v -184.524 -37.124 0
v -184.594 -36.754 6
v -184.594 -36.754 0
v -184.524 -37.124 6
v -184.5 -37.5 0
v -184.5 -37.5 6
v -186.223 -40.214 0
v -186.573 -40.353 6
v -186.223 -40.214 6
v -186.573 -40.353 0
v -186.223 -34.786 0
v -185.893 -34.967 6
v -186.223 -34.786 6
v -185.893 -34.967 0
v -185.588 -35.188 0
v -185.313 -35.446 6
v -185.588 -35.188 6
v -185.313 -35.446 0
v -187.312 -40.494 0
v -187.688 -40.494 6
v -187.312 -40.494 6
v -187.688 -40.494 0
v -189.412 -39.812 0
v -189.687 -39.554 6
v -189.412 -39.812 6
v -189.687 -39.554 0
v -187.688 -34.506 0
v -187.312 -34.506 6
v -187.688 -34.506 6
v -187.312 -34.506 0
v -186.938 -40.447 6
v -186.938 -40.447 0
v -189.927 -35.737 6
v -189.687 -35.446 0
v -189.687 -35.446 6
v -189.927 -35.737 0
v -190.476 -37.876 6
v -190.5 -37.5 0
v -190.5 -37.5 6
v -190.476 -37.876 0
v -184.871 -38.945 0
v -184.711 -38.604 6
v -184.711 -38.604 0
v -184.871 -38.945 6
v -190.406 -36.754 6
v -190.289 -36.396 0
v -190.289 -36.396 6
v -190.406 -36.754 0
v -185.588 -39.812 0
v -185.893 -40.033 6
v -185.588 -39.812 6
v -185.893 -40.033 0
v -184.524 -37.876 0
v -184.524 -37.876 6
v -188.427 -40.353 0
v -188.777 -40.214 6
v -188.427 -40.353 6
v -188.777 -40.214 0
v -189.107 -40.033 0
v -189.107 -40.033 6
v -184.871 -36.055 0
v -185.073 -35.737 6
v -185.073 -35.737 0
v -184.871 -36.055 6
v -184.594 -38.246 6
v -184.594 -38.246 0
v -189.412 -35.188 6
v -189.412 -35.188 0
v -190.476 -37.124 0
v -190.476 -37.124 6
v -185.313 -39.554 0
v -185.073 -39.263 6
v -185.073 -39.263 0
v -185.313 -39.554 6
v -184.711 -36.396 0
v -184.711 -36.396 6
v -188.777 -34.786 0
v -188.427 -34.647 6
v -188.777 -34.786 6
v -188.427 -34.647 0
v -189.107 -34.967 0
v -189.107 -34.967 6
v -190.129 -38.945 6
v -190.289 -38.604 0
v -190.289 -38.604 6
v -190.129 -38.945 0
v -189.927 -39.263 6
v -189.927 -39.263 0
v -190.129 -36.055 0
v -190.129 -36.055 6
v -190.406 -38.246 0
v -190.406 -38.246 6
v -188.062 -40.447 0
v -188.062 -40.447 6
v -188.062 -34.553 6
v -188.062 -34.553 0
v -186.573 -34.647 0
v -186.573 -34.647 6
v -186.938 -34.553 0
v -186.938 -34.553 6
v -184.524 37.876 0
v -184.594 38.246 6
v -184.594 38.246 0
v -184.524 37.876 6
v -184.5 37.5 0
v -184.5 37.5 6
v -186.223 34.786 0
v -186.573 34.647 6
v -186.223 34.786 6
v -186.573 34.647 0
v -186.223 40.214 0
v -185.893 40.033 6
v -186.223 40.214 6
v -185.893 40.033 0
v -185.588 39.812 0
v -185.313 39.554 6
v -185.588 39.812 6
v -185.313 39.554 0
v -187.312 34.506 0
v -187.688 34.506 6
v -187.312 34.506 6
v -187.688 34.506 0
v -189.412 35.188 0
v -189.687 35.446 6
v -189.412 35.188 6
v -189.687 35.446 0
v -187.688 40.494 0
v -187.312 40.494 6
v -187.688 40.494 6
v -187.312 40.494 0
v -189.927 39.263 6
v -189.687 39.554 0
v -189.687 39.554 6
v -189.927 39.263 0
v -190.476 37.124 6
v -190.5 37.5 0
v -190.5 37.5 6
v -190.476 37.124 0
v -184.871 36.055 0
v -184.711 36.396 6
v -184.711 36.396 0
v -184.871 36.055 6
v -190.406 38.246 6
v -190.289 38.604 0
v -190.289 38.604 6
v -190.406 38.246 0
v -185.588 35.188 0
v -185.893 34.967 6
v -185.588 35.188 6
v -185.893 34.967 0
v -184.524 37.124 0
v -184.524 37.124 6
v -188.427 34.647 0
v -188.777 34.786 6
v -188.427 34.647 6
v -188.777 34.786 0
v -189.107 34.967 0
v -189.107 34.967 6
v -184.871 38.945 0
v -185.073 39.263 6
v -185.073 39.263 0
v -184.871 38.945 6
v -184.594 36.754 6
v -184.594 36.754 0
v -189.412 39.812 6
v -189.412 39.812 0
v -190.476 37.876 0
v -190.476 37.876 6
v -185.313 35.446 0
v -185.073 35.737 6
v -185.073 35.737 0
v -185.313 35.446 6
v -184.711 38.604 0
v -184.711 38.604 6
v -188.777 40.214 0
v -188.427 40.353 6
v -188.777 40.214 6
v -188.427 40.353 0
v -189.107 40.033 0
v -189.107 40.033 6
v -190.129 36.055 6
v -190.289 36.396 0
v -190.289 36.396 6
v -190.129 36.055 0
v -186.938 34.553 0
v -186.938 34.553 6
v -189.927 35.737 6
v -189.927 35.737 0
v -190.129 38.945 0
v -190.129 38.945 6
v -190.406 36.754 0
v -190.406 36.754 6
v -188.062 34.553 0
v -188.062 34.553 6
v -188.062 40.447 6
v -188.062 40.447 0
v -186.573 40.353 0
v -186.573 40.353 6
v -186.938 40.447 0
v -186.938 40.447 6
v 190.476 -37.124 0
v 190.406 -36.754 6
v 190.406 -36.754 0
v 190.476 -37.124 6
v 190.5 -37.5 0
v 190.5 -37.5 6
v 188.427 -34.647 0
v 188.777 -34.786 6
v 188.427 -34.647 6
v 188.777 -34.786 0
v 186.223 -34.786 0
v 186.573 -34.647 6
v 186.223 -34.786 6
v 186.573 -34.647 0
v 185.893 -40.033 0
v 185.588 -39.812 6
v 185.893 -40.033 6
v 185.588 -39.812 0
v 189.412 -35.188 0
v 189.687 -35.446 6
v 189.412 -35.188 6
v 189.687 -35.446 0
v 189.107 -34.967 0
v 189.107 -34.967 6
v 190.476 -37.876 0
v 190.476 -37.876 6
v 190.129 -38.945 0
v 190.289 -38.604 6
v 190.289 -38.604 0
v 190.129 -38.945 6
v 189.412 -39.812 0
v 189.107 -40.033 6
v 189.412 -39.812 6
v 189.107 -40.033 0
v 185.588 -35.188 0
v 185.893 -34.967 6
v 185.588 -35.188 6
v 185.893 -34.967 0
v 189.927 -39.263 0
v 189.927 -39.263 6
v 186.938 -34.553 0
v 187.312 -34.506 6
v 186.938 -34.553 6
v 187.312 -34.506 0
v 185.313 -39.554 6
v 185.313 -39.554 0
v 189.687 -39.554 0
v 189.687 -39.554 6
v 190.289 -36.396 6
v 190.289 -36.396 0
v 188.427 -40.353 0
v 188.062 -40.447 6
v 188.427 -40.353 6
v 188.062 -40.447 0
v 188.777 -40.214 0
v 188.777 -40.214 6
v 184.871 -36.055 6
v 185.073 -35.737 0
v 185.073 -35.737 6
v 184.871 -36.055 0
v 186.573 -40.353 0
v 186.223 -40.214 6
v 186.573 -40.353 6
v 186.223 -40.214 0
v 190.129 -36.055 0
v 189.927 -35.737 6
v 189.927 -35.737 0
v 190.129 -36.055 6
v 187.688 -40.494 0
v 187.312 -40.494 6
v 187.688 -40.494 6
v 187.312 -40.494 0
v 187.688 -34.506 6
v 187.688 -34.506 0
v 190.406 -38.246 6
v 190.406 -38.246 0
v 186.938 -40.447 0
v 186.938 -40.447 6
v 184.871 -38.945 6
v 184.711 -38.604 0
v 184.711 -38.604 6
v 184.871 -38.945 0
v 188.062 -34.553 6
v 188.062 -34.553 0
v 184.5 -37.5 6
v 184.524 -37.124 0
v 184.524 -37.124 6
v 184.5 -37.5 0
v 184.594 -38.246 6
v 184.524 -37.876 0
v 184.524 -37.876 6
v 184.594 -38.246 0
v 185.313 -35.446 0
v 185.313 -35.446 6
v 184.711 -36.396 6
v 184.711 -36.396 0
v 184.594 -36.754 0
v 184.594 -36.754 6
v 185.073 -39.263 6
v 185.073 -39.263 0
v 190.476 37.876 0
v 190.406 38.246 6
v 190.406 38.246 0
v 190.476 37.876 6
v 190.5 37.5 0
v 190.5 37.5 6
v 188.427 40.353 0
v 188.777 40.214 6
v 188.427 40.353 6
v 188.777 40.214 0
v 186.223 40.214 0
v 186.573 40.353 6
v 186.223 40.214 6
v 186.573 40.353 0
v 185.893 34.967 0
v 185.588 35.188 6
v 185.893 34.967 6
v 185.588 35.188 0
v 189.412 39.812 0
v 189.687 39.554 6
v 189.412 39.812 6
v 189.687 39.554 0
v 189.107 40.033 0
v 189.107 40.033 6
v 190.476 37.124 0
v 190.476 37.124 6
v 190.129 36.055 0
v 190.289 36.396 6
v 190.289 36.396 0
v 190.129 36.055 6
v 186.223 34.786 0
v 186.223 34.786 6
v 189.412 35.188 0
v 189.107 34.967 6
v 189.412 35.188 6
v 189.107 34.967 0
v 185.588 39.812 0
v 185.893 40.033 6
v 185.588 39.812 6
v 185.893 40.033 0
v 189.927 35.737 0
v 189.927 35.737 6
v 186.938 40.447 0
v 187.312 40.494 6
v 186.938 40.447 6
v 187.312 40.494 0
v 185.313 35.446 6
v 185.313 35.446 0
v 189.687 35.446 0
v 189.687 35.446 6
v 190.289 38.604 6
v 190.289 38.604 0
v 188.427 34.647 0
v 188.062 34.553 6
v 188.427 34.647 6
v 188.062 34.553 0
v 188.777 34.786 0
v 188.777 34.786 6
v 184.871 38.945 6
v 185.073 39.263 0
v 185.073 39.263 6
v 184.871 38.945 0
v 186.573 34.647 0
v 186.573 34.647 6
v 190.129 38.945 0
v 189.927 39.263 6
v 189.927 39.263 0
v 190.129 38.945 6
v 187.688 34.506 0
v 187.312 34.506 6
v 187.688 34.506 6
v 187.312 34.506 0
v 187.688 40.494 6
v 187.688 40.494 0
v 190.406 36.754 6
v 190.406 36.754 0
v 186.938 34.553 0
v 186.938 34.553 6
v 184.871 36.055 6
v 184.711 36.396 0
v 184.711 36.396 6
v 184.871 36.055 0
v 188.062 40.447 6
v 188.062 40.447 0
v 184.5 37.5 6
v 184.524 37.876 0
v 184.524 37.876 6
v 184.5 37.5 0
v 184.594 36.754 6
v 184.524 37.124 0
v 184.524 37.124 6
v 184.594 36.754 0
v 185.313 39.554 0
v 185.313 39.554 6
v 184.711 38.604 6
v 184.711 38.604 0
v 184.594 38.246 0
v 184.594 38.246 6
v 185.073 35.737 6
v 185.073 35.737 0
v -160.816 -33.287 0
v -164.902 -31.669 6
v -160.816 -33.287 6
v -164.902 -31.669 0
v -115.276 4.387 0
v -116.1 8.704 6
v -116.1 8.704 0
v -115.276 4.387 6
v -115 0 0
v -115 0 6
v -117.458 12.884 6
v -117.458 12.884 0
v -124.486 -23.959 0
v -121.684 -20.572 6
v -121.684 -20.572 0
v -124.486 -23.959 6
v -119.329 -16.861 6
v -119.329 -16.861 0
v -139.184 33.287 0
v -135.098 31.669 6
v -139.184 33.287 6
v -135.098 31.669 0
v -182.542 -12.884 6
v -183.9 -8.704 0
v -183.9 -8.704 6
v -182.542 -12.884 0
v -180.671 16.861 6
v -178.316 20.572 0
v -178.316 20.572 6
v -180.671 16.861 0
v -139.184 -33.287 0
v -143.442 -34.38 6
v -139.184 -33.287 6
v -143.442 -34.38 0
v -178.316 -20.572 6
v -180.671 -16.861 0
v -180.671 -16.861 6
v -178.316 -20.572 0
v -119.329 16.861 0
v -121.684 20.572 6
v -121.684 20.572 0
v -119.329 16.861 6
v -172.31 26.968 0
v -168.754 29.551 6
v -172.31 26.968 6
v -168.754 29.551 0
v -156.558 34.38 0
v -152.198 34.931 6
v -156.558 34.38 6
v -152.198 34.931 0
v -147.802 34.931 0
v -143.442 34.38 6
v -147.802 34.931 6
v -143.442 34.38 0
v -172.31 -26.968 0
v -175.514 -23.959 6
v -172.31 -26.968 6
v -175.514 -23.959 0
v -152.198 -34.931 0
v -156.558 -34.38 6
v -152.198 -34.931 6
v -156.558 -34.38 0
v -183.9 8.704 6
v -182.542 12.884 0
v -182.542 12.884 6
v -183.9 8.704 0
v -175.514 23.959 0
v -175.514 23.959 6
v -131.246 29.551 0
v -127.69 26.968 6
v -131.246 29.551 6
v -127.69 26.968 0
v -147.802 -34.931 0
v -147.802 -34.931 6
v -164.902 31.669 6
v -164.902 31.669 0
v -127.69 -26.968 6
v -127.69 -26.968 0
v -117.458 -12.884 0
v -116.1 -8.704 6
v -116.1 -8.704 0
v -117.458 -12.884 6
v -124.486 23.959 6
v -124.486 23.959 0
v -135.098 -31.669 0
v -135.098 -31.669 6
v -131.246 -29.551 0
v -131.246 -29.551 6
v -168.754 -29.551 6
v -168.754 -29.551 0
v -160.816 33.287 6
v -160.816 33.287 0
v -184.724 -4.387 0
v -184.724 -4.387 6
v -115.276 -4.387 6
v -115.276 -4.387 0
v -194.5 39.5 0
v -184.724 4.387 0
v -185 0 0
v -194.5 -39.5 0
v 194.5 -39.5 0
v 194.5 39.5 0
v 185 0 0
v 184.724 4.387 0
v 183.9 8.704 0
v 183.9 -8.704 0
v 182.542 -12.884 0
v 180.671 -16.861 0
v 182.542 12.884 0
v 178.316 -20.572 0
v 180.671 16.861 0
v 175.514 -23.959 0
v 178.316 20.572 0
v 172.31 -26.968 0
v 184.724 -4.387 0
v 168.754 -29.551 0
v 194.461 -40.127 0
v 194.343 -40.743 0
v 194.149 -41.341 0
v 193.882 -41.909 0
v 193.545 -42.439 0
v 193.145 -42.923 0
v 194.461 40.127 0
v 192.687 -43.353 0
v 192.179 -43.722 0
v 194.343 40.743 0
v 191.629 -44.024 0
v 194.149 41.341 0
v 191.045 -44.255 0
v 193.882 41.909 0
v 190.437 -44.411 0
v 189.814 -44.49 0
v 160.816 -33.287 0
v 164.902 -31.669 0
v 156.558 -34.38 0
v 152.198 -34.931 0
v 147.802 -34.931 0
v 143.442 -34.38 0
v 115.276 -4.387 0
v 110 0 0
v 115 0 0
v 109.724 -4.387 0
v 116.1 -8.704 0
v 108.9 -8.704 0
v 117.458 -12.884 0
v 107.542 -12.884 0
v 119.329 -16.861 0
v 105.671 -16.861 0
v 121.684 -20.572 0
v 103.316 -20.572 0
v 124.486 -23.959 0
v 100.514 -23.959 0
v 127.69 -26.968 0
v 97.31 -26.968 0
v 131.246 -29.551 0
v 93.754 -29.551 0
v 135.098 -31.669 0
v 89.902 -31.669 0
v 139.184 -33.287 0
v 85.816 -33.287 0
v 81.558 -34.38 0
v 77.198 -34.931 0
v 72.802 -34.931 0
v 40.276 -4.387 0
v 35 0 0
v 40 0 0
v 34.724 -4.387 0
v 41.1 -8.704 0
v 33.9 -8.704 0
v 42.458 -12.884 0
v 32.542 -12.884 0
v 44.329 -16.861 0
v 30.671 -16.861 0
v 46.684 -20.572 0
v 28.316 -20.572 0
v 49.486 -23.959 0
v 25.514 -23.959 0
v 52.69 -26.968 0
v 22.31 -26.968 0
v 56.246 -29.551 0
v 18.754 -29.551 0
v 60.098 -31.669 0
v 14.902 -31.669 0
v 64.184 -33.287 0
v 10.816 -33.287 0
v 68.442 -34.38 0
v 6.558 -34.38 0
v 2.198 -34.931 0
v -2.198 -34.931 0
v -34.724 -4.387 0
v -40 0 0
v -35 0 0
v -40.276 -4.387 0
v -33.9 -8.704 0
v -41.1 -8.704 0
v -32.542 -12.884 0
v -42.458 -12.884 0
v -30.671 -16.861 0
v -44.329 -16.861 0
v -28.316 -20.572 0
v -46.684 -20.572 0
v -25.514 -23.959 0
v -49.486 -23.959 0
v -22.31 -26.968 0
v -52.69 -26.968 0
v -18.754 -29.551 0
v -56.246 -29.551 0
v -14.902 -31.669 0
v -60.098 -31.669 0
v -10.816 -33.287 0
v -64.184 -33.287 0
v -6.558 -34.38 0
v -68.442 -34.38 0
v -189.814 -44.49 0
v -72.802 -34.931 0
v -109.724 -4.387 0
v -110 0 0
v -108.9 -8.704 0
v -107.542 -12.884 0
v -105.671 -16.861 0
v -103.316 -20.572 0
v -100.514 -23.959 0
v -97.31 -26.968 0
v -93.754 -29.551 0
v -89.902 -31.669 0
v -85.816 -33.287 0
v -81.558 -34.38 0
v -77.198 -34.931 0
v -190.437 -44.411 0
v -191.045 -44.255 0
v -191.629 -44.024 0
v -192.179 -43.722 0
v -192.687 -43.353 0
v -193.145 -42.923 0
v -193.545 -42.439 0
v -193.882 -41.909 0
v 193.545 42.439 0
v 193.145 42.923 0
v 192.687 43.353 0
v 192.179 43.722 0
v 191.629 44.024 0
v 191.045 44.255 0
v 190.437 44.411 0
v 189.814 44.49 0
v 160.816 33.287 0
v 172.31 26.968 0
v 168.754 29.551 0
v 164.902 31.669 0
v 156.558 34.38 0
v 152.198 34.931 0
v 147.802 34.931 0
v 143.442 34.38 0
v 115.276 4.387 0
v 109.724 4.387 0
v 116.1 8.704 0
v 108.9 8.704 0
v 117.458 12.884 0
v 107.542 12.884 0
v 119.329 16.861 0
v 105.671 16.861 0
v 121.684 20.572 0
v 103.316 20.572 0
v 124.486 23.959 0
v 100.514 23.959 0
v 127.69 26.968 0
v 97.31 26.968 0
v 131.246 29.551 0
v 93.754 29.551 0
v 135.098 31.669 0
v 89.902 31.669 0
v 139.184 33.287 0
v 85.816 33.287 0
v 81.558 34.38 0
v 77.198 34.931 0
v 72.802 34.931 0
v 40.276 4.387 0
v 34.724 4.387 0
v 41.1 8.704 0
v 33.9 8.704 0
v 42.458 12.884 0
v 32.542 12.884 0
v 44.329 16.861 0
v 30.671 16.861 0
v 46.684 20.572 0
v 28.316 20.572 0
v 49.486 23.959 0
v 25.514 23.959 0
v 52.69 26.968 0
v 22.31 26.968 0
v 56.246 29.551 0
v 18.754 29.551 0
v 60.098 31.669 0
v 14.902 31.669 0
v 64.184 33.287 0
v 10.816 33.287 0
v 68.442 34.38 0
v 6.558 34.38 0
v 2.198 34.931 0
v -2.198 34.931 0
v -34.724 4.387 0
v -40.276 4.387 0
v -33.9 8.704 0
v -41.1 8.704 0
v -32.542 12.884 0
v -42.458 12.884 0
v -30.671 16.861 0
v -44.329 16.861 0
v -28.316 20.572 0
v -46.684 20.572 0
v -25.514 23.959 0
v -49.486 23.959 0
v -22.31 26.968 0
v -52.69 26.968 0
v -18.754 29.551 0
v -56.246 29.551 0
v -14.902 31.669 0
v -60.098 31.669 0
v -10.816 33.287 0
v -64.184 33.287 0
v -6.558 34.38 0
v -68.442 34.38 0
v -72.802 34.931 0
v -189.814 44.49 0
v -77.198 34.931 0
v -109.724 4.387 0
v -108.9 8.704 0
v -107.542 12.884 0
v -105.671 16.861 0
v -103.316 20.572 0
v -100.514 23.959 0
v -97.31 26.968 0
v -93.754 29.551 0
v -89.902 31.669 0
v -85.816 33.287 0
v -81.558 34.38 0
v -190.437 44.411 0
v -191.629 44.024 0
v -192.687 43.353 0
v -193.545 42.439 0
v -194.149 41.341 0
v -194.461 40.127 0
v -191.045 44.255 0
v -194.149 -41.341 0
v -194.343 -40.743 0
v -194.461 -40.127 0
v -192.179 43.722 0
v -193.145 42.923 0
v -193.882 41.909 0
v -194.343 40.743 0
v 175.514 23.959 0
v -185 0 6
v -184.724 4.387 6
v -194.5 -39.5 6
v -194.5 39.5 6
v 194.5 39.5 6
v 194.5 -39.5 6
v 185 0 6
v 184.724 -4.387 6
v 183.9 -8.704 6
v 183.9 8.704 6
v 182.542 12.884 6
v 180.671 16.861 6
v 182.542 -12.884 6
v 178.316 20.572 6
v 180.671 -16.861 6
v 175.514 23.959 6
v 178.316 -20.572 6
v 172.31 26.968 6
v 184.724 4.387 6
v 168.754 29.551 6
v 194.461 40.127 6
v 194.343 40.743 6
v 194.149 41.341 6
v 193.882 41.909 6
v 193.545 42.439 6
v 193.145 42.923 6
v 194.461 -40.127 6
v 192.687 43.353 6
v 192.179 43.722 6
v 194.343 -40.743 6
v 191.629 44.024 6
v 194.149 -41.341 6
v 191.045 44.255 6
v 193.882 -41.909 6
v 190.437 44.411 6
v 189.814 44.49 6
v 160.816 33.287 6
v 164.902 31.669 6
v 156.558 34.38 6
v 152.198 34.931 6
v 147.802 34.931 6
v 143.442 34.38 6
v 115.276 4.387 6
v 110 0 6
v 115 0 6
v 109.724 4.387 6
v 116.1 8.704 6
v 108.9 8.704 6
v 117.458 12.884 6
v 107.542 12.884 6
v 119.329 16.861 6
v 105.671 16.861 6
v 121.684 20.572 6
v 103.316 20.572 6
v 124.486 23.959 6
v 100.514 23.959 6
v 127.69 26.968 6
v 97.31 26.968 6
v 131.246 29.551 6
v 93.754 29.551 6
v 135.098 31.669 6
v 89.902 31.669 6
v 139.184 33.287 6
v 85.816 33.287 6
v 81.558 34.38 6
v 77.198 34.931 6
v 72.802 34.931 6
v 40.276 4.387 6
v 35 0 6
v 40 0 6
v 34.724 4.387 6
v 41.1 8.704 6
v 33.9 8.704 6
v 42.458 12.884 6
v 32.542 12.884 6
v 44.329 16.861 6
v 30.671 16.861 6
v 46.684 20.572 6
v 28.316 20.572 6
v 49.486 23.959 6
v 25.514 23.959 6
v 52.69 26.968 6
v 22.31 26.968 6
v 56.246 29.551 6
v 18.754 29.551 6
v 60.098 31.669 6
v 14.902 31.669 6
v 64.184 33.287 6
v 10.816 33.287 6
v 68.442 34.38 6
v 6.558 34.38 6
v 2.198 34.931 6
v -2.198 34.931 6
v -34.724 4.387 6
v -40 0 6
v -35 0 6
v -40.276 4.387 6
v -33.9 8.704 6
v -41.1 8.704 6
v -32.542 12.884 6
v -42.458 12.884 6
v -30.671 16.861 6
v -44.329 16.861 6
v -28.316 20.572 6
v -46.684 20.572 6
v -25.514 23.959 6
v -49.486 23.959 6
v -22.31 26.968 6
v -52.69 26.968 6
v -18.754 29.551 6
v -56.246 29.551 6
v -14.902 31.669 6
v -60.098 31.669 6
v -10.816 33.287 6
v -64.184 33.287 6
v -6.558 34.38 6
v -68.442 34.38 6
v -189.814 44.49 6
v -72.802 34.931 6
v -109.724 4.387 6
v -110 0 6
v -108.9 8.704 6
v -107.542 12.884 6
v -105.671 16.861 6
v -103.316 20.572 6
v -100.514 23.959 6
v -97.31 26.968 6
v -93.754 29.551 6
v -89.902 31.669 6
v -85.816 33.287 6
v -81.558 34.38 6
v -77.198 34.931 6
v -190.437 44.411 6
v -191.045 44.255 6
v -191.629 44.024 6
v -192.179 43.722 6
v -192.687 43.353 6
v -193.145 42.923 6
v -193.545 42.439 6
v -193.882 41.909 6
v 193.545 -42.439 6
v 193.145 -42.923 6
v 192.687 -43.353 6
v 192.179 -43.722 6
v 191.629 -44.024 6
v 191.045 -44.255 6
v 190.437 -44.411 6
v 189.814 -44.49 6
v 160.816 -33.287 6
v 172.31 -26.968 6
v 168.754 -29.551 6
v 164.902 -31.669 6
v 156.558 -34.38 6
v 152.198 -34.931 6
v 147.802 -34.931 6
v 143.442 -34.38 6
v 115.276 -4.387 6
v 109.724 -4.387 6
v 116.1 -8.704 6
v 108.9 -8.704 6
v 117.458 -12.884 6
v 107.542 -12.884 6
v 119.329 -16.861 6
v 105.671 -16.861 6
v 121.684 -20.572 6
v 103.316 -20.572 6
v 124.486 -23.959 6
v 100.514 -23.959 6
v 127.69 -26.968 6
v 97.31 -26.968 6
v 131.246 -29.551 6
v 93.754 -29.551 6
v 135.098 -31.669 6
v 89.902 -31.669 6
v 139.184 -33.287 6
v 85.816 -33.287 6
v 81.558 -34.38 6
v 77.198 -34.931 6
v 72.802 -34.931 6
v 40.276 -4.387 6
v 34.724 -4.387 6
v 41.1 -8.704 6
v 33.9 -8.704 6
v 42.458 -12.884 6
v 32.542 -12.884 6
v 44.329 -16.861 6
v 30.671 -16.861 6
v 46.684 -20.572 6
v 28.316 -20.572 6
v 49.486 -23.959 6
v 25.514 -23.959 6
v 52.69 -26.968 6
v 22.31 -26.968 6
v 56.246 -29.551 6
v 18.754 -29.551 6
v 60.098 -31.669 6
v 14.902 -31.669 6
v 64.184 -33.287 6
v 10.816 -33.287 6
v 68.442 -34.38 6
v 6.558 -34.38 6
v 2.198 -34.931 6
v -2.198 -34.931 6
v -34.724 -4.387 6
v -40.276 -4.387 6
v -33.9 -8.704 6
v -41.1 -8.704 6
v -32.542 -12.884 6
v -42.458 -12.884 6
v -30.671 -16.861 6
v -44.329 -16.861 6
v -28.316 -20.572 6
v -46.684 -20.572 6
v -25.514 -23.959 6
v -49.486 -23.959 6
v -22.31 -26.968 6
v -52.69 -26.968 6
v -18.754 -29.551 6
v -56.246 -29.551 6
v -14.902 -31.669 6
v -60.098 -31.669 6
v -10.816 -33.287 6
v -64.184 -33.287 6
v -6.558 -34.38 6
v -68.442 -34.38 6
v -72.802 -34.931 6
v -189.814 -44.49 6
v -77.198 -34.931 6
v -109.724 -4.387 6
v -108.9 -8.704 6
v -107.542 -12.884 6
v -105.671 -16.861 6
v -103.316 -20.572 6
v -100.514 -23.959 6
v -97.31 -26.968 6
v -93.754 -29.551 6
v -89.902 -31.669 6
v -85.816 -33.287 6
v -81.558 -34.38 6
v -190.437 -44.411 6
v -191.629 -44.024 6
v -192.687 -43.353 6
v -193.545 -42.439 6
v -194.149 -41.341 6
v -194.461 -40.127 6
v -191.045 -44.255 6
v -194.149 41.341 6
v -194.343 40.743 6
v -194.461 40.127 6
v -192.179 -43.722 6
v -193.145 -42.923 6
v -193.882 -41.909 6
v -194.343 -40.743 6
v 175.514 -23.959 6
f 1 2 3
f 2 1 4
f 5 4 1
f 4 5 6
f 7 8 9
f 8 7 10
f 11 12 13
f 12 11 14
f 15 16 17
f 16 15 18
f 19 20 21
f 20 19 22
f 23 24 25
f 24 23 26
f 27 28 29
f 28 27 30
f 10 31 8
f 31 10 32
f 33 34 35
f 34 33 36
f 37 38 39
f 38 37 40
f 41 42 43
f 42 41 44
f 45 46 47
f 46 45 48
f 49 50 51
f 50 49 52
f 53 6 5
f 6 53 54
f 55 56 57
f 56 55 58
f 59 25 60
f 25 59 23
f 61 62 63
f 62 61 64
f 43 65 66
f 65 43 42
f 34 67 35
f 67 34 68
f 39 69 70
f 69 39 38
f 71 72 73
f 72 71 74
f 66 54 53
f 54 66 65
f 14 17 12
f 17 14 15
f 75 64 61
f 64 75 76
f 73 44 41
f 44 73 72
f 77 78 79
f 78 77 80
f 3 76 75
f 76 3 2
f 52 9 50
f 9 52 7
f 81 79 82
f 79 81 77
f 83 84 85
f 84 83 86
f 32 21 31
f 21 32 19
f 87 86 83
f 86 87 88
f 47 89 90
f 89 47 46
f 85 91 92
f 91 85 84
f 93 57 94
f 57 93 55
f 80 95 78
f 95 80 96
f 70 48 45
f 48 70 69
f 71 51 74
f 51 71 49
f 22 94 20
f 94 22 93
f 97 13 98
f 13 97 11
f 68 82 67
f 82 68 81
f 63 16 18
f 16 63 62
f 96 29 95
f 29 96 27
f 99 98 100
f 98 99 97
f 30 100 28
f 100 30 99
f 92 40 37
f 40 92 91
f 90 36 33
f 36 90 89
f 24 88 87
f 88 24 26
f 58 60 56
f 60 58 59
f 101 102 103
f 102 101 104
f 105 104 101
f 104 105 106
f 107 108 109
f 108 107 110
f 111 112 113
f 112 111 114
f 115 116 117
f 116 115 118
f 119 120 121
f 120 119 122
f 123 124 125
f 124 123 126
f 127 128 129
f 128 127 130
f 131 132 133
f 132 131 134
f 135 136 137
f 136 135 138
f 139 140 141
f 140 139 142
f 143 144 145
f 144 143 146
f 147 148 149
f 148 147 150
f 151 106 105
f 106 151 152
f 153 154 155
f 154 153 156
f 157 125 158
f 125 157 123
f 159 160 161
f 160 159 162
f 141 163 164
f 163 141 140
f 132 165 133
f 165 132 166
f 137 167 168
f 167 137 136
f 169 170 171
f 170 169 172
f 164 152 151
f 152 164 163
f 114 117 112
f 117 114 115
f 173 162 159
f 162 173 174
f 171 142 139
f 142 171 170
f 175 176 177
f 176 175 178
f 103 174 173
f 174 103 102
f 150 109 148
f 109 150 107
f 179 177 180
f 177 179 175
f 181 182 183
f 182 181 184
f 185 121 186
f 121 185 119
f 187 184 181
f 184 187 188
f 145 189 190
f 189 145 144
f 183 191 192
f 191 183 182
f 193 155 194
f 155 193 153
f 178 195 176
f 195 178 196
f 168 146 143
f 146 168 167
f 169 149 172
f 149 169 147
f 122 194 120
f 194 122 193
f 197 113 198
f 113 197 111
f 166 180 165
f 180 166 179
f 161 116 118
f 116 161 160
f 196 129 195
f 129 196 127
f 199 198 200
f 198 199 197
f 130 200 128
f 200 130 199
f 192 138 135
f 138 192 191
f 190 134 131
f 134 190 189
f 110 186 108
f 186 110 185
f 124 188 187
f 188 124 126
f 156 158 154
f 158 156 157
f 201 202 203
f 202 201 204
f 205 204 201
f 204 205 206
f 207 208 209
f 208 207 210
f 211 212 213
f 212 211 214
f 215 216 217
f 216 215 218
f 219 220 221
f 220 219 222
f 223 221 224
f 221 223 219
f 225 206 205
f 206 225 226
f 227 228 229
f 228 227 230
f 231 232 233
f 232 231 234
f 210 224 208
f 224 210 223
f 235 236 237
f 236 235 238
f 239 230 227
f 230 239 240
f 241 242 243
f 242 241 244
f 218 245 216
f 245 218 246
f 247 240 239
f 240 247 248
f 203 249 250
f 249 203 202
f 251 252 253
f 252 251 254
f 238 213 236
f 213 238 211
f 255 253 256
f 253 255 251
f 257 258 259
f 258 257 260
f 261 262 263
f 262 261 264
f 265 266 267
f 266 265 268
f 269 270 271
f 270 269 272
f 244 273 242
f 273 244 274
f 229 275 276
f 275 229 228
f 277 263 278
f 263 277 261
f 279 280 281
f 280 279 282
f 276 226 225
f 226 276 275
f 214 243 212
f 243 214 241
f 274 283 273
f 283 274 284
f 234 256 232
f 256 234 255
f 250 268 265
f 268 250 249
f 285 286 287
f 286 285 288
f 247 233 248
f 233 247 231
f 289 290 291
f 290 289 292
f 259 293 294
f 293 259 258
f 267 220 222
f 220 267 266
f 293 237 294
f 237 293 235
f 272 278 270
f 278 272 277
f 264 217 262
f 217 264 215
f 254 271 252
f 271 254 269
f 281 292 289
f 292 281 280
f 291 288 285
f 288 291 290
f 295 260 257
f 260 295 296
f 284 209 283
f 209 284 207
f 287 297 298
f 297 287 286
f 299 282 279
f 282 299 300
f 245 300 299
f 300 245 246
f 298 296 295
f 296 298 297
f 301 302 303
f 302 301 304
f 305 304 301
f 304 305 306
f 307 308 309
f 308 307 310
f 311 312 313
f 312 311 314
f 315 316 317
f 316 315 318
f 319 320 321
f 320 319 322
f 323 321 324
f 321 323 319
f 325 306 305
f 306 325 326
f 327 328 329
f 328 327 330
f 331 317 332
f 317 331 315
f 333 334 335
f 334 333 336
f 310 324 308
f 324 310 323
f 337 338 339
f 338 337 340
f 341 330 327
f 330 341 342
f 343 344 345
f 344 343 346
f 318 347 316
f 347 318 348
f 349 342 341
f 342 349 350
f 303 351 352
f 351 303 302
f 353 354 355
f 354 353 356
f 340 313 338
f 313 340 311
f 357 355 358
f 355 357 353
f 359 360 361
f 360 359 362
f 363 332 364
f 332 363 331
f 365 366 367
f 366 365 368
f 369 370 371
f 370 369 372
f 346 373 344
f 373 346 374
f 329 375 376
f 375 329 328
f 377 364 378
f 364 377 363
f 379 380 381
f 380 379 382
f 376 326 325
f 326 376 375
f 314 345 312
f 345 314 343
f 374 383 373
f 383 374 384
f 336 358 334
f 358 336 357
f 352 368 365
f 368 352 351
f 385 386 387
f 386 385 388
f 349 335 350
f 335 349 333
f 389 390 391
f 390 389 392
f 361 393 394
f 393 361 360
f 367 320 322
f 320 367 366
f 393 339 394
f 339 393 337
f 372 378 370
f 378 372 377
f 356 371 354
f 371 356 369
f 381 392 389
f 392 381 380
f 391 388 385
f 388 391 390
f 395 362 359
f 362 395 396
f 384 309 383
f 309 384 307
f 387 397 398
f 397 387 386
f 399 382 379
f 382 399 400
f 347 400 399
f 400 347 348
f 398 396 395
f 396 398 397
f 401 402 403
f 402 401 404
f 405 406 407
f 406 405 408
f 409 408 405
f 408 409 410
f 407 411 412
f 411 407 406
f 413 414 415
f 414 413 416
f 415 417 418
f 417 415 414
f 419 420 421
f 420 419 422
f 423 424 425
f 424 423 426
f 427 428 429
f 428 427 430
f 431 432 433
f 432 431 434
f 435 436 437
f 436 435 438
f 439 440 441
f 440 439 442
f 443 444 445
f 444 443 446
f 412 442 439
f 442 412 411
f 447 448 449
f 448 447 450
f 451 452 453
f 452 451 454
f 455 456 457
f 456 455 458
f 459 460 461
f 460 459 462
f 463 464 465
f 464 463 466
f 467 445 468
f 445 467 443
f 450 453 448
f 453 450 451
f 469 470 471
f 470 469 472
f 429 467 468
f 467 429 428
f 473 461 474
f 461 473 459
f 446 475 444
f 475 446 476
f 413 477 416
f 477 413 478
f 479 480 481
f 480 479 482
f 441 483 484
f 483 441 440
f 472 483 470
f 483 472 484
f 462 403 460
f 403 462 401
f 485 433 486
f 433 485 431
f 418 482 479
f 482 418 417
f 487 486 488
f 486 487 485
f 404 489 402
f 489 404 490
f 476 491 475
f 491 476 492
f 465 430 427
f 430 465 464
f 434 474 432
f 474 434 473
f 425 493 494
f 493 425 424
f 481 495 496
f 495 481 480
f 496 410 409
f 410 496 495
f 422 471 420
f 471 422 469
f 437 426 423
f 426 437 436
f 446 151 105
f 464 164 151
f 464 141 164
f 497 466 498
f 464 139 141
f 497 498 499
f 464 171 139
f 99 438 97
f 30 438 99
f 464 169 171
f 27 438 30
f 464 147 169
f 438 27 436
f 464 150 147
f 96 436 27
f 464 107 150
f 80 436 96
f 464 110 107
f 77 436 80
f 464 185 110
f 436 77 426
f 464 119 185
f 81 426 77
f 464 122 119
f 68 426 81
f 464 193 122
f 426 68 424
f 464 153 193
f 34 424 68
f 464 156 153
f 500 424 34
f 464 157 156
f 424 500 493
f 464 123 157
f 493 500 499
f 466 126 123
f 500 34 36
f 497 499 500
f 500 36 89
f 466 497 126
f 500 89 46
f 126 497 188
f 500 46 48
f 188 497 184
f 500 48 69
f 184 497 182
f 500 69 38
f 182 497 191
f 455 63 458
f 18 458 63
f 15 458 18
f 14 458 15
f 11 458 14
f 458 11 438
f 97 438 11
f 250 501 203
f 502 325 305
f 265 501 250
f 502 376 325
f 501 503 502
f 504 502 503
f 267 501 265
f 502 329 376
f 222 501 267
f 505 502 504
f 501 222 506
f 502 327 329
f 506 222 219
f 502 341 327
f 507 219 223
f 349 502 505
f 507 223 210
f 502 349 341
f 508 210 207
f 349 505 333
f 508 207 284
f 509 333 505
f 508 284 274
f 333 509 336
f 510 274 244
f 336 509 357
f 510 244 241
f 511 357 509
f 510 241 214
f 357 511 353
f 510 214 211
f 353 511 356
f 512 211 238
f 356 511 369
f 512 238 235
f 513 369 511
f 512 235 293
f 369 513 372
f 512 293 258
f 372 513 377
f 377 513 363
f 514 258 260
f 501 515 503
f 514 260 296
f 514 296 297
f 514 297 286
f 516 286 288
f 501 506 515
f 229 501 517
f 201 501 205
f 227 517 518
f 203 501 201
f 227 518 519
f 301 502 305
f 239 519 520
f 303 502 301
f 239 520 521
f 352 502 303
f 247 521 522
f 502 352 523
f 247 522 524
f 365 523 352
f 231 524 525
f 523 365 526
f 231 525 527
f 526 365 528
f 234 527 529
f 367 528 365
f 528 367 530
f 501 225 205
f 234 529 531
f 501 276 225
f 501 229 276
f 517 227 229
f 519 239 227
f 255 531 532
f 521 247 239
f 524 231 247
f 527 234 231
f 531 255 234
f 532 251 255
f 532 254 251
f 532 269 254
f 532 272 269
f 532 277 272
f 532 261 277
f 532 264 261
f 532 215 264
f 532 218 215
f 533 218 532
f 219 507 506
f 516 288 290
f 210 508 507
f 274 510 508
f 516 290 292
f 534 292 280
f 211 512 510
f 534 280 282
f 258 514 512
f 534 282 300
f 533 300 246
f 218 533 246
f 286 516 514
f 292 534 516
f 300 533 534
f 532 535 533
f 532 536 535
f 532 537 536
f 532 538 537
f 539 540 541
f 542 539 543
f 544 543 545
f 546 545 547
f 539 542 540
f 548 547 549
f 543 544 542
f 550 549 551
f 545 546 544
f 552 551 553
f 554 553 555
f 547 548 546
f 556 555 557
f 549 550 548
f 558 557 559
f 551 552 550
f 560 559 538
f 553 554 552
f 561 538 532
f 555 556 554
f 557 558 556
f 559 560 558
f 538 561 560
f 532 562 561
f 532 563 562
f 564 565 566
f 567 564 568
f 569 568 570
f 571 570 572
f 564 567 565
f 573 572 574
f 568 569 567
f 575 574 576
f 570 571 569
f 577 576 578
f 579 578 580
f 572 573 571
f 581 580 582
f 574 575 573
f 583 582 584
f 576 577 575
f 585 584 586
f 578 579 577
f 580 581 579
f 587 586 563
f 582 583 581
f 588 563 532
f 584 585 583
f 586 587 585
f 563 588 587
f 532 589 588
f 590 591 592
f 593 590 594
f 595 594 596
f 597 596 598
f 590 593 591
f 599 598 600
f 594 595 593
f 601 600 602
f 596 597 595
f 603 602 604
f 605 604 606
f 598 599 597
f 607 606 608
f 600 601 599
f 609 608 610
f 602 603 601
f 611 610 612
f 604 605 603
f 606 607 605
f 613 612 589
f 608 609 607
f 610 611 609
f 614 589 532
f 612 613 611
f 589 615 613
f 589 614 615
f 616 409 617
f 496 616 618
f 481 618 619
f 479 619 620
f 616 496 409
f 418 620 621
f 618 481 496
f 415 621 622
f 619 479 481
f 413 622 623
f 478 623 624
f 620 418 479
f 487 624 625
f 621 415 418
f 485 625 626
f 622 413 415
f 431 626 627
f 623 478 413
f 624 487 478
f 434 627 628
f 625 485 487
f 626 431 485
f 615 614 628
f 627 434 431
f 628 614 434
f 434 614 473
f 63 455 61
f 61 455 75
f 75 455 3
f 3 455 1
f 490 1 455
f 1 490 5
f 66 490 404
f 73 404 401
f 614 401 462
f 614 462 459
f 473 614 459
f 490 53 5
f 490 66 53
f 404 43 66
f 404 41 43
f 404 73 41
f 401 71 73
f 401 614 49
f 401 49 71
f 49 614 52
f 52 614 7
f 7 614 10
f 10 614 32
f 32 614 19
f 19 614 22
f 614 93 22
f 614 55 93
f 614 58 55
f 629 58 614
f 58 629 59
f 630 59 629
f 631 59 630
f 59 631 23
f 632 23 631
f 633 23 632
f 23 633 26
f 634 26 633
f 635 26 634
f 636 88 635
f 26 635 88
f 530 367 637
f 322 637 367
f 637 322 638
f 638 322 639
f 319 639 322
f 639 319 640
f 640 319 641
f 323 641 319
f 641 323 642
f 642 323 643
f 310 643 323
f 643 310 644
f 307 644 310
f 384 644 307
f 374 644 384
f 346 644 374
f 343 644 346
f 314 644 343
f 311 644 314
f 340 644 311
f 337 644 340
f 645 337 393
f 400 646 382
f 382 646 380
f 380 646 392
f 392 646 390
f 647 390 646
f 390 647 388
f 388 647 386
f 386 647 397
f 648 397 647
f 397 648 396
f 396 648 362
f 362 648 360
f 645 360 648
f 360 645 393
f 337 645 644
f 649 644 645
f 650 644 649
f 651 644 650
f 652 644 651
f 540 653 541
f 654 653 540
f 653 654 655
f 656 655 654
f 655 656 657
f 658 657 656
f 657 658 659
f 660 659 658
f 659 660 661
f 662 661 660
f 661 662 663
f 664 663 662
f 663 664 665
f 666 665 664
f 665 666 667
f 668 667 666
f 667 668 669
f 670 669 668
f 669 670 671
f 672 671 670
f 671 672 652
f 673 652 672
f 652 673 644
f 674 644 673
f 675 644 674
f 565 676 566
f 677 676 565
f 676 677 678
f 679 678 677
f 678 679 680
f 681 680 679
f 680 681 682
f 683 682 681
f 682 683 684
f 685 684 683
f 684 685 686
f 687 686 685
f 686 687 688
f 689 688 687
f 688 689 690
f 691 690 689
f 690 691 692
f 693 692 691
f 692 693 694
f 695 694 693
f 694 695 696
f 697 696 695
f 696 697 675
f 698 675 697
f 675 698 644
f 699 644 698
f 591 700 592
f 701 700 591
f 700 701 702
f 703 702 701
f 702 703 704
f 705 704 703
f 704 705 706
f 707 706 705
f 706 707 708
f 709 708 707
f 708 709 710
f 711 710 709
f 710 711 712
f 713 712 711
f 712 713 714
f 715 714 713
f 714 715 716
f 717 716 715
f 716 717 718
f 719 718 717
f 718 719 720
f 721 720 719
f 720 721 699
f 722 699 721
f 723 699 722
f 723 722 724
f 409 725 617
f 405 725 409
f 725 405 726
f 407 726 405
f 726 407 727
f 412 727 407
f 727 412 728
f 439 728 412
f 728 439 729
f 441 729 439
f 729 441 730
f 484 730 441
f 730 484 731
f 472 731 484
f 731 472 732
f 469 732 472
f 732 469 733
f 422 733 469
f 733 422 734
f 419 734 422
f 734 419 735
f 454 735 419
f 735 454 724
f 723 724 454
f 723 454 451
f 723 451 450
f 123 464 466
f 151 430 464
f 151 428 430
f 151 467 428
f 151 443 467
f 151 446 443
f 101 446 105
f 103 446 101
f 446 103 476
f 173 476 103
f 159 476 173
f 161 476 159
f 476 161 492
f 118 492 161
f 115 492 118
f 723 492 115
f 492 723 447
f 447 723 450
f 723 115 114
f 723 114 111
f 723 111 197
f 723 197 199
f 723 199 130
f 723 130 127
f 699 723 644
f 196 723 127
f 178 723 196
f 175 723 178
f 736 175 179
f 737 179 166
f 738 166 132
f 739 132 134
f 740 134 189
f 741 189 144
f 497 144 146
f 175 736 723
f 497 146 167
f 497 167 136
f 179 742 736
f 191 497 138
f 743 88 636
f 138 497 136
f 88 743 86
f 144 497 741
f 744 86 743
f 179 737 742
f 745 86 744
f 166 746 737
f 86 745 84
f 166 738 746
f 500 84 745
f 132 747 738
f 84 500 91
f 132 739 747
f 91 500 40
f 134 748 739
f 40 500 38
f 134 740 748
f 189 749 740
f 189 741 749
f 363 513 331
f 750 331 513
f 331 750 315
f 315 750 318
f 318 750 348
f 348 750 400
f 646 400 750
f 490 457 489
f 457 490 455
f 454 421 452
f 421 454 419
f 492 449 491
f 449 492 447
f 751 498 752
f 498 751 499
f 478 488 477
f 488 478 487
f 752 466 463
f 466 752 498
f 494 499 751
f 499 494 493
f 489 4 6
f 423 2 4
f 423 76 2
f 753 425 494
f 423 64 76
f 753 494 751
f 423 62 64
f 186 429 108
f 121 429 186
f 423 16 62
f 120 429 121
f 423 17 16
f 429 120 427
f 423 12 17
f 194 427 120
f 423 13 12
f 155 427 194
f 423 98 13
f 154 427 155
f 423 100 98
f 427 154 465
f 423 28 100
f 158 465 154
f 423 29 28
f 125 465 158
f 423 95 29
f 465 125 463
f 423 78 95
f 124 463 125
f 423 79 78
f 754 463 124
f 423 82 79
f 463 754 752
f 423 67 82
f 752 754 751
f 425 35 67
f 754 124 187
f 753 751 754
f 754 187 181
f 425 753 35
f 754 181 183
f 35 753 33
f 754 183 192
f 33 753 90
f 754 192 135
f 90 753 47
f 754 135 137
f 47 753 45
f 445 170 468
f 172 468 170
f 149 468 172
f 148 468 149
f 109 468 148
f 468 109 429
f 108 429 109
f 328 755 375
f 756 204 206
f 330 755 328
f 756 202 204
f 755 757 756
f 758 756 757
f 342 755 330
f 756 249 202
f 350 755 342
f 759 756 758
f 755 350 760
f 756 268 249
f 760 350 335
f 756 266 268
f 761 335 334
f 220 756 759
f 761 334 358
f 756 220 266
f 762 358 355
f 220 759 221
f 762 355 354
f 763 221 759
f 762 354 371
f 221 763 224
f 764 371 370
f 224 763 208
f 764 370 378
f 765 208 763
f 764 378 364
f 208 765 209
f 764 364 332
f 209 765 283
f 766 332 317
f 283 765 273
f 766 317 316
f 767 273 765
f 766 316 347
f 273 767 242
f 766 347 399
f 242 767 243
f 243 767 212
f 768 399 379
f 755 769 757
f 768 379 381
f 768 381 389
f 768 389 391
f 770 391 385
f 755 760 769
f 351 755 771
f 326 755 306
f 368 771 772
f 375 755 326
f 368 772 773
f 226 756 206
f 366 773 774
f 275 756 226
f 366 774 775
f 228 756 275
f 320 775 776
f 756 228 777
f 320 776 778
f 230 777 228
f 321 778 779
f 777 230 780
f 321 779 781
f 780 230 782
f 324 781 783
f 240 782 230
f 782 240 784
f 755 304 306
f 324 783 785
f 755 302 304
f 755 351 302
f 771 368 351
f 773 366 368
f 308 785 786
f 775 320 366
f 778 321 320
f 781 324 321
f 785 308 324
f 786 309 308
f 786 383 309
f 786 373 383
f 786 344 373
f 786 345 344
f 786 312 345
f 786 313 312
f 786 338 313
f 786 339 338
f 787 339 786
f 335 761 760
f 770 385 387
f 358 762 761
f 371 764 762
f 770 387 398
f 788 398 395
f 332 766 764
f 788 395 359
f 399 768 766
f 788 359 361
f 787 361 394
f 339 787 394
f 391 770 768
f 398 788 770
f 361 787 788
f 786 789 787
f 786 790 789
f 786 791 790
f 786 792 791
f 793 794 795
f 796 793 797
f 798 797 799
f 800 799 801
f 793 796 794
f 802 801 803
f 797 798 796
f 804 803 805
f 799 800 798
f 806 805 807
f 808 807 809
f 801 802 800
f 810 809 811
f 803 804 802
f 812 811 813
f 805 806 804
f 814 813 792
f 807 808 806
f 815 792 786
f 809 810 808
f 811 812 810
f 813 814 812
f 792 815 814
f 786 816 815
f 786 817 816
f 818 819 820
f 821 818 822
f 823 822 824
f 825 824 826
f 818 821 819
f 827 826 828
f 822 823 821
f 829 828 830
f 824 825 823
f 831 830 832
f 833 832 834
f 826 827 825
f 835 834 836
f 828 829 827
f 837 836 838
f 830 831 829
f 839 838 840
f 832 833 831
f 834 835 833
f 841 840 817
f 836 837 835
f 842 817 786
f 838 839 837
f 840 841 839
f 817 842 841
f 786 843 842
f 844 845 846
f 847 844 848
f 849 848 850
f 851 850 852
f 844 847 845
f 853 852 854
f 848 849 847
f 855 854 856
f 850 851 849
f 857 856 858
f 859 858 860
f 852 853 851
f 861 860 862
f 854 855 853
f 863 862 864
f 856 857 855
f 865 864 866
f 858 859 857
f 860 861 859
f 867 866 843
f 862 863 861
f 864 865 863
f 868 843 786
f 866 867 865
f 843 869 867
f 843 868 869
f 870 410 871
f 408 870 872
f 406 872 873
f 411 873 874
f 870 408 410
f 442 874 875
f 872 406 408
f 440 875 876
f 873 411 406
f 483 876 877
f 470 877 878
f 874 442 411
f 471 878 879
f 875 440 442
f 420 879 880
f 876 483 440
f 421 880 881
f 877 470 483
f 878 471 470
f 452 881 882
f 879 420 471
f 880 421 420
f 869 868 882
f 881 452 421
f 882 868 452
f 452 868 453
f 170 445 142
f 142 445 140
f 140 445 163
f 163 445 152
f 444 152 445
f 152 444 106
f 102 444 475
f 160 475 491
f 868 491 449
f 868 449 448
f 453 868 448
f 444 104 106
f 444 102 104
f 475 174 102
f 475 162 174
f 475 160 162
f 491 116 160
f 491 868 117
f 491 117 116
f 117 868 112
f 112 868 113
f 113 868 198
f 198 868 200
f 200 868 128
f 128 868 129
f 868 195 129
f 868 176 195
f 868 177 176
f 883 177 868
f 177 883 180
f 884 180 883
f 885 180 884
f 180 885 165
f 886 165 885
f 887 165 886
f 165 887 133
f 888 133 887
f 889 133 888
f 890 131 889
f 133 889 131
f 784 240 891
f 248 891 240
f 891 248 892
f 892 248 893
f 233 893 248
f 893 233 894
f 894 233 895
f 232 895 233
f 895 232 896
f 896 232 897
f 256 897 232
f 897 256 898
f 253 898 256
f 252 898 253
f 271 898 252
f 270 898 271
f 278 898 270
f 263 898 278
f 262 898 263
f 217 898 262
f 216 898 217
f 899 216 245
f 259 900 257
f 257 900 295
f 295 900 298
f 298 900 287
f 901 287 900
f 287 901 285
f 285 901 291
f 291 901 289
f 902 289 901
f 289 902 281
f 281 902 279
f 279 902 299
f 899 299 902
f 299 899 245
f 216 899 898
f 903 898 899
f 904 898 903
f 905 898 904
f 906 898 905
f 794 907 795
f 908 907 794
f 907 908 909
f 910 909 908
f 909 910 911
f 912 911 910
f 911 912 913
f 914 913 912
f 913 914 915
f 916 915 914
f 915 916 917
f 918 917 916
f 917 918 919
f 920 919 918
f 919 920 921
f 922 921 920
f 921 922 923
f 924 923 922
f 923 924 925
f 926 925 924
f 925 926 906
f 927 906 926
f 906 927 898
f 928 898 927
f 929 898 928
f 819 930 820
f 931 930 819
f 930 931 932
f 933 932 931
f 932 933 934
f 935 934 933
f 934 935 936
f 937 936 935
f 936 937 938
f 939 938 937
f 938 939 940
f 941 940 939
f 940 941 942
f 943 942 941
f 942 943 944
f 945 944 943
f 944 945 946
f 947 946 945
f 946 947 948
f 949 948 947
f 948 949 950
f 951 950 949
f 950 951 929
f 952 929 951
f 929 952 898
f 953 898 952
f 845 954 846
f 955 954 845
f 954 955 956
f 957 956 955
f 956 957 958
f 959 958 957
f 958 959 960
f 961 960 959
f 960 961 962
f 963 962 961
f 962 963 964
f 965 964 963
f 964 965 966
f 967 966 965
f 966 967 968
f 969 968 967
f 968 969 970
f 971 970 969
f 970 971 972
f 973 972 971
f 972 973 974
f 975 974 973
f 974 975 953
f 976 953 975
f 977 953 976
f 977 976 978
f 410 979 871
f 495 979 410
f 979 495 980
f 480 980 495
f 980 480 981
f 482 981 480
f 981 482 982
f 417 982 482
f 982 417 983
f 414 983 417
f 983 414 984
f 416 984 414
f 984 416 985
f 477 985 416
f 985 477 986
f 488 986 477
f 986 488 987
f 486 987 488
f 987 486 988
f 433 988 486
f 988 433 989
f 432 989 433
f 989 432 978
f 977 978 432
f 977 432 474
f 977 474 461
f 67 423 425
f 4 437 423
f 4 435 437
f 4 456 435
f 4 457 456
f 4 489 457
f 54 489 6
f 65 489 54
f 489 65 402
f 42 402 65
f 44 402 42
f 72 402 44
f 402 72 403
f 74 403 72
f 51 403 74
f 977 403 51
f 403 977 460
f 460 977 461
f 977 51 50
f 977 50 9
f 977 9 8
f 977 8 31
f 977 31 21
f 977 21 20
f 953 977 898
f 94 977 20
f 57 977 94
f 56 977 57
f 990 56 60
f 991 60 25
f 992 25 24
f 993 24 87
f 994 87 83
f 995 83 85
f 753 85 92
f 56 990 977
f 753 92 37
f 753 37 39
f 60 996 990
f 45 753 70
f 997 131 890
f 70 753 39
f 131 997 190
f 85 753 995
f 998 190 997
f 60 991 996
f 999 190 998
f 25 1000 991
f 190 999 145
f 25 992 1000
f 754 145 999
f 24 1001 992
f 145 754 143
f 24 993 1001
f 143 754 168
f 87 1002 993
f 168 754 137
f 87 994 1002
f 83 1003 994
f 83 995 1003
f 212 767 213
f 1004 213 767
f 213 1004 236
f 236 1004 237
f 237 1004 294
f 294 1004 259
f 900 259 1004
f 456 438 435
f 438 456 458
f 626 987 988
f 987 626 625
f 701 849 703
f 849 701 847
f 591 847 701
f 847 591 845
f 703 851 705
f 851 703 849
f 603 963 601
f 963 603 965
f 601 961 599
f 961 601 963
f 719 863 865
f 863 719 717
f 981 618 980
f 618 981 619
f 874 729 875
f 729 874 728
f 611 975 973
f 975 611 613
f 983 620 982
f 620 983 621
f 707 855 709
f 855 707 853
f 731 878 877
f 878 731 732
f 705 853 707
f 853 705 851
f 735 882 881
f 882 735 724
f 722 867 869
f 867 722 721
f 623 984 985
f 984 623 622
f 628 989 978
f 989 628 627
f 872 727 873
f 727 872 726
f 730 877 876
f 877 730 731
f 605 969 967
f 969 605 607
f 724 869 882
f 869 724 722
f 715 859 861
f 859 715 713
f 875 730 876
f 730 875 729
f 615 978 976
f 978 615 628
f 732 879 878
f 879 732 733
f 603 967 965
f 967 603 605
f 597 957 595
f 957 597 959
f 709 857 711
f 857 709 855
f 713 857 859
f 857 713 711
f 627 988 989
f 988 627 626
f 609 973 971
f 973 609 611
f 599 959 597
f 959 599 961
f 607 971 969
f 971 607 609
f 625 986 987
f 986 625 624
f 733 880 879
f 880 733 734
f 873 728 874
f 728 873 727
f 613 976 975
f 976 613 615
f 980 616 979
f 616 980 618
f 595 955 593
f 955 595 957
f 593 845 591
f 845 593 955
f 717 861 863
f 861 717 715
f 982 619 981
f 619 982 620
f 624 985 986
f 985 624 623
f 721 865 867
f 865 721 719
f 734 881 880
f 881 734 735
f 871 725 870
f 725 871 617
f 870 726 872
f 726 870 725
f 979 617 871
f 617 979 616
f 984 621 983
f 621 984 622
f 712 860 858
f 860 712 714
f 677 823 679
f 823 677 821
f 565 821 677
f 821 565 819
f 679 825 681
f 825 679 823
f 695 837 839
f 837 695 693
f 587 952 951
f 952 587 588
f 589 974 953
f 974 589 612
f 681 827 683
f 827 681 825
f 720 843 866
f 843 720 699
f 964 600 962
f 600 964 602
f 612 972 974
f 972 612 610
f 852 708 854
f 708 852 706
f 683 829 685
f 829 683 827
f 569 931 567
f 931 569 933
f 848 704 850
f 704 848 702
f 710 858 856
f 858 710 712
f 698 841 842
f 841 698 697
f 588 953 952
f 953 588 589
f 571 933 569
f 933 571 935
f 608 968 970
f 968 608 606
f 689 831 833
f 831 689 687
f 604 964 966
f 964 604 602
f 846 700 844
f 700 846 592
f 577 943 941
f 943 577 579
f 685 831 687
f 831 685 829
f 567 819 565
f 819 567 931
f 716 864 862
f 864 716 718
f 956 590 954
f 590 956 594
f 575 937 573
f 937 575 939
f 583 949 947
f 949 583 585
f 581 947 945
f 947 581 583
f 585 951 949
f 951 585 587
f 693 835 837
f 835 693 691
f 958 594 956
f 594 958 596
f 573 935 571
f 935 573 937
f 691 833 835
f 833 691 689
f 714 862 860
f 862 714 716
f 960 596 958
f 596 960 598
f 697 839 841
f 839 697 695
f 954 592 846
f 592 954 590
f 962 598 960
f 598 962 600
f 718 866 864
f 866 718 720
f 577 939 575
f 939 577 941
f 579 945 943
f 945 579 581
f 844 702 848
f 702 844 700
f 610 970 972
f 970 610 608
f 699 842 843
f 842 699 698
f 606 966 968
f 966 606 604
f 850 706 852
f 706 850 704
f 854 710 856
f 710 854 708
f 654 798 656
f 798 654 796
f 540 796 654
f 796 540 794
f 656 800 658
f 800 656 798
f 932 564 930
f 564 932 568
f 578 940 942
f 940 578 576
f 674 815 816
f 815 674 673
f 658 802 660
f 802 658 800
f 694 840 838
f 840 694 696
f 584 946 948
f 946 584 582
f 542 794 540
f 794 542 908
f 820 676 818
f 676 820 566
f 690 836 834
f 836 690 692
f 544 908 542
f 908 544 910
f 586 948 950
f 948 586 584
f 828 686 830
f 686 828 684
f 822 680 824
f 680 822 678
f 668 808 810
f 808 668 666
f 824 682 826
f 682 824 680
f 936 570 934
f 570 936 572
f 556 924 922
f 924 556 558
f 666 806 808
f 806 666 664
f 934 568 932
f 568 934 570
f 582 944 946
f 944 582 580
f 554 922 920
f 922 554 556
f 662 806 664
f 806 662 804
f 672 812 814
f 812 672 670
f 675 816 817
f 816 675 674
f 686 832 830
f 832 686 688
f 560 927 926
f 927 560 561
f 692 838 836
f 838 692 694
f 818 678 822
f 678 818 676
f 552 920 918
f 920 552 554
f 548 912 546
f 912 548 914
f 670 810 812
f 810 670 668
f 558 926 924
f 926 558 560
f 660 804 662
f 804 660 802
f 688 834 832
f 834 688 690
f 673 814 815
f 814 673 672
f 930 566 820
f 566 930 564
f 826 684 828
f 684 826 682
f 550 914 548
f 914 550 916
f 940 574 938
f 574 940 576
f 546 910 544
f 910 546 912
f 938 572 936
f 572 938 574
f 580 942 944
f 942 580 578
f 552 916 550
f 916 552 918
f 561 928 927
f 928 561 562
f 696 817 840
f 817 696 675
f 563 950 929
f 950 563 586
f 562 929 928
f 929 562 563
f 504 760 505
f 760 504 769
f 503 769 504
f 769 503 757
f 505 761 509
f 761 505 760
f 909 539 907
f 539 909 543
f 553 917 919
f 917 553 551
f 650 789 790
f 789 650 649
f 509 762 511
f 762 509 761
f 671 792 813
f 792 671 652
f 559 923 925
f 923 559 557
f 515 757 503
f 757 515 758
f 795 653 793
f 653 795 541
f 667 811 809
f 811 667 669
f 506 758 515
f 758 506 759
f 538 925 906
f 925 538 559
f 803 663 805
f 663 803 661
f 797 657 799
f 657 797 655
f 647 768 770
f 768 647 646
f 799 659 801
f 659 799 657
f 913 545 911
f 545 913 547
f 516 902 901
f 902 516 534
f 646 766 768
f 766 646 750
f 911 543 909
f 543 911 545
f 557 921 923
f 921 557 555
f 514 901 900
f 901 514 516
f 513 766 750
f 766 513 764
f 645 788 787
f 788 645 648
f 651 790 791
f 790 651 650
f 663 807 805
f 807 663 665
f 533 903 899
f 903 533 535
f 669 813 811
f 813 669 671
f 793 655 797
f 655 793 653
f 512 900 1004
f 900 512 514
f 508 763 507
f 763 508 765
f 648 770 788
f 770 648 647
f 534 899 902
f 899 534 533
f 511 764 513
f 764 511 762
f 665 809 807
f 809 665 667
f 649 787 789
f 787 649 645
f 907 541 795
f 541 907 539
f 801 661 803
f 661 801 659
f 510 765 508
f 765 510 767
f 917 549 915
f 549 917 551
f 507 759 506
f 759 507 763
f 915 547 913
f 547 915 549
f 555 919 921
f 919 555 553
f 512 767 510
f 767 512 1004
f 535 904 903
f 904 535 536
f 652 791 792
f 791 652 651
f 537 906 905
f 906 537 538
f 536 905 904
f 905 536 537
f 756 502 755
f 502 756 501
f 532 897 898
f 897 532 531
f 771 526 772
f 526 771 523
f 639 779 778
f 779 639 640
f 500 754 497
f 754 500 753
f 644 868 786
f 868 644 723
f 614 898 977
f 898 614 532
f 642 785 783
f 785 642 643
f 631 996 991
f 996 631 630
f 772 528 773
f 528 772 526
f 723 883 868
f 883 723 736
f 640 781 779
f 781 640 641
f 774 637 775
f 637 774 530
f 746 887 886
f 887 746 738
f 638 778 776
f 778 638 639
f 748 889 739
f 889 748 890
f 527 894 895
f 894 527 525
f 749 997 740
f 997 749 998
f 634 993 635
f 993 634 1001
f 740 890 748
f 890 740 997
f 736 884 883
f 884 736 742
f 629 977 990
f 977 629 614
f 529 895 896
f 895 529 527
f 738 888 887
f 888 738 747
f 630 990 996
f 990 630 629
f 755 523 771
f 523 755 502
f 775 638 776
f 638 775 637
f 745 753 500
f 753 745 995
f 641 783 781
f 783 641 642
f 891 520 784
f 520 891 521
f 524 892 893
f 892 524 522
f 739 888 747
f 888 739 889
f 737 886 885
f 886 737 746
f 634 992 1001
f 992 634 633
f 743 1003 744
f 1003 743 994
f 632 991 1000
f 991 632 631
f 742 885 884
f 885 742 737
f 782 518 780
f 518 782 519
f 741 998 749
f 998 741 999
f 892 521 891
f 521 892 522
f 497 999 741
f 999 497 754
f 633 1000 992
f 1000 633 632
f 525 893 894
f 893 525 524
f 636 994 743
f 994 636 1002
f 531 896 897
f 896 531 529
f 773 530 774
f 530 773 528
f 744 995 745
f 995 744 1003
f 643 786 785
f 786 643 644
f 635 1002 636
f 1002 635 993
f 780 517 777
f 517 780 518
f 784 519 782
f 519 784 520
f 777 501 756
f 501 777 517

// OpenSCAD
$fn = 50;


difference() {
	union() {
		hull() {
			translate(v = [-189.5000000000, 39.5000000000, 0]) {
				cylinder(h = 6, r = 5);
			}
			translate(v = [189.5000000000, 39.5000000000, 0]) {
				cylinder(h = 6, r = 5);
			}
			translate(v = [-189.5000000000, -39.5000000000, 0]) {
				cylinder(h = 6, r = 5);
			}
			translate(v = [189.5000000000, -39.5000000000, 0]) {
				cylinder(h = 6, r = 5);
			}
		}
	}
	union() {
		#translate(v = [-187.5000000000, -37.5000000000, -100.0000000000]) {
			cylinder(h = 200, r = 3.0000000000);
		}
		#translate(v = [-187.5000000000, 37.5000000000, -100.0000000000]) {
			cylinder(h = 200, r = 3.0000000000);
		}
		#translate(v = [187.5000000000, -37.5000000000, -100.0000000000]) {
			cylinder(h = 200, r = 3.0000000000);
		}
		#translate(v = [187.5000000000, 37.5000000000, -100.0000000000]) {
			cylinder(h = 200, r = 3.0000000000);
		}
		#translate(v = [-150.0000000000, 0, 0]) {
			cylinder(h = 6, r = 35.0000000000);
		}
		#translate(v = [-75.0000000000, 0, 0]) {
			cylinder(h = 6, r = 35.0000000000);
		}
		#cylinder(h = 6, r = 35.0000000000);
		#translate(v = [75.0000000000, 0, 0]) {
			cylinder(h = 6, r = 35.0000000000);
		}
		#translate(v = [150.0000000000, 0, 0]) {
			cylinder(h = 6, r = 35.0000000000);
		}
	}
}
